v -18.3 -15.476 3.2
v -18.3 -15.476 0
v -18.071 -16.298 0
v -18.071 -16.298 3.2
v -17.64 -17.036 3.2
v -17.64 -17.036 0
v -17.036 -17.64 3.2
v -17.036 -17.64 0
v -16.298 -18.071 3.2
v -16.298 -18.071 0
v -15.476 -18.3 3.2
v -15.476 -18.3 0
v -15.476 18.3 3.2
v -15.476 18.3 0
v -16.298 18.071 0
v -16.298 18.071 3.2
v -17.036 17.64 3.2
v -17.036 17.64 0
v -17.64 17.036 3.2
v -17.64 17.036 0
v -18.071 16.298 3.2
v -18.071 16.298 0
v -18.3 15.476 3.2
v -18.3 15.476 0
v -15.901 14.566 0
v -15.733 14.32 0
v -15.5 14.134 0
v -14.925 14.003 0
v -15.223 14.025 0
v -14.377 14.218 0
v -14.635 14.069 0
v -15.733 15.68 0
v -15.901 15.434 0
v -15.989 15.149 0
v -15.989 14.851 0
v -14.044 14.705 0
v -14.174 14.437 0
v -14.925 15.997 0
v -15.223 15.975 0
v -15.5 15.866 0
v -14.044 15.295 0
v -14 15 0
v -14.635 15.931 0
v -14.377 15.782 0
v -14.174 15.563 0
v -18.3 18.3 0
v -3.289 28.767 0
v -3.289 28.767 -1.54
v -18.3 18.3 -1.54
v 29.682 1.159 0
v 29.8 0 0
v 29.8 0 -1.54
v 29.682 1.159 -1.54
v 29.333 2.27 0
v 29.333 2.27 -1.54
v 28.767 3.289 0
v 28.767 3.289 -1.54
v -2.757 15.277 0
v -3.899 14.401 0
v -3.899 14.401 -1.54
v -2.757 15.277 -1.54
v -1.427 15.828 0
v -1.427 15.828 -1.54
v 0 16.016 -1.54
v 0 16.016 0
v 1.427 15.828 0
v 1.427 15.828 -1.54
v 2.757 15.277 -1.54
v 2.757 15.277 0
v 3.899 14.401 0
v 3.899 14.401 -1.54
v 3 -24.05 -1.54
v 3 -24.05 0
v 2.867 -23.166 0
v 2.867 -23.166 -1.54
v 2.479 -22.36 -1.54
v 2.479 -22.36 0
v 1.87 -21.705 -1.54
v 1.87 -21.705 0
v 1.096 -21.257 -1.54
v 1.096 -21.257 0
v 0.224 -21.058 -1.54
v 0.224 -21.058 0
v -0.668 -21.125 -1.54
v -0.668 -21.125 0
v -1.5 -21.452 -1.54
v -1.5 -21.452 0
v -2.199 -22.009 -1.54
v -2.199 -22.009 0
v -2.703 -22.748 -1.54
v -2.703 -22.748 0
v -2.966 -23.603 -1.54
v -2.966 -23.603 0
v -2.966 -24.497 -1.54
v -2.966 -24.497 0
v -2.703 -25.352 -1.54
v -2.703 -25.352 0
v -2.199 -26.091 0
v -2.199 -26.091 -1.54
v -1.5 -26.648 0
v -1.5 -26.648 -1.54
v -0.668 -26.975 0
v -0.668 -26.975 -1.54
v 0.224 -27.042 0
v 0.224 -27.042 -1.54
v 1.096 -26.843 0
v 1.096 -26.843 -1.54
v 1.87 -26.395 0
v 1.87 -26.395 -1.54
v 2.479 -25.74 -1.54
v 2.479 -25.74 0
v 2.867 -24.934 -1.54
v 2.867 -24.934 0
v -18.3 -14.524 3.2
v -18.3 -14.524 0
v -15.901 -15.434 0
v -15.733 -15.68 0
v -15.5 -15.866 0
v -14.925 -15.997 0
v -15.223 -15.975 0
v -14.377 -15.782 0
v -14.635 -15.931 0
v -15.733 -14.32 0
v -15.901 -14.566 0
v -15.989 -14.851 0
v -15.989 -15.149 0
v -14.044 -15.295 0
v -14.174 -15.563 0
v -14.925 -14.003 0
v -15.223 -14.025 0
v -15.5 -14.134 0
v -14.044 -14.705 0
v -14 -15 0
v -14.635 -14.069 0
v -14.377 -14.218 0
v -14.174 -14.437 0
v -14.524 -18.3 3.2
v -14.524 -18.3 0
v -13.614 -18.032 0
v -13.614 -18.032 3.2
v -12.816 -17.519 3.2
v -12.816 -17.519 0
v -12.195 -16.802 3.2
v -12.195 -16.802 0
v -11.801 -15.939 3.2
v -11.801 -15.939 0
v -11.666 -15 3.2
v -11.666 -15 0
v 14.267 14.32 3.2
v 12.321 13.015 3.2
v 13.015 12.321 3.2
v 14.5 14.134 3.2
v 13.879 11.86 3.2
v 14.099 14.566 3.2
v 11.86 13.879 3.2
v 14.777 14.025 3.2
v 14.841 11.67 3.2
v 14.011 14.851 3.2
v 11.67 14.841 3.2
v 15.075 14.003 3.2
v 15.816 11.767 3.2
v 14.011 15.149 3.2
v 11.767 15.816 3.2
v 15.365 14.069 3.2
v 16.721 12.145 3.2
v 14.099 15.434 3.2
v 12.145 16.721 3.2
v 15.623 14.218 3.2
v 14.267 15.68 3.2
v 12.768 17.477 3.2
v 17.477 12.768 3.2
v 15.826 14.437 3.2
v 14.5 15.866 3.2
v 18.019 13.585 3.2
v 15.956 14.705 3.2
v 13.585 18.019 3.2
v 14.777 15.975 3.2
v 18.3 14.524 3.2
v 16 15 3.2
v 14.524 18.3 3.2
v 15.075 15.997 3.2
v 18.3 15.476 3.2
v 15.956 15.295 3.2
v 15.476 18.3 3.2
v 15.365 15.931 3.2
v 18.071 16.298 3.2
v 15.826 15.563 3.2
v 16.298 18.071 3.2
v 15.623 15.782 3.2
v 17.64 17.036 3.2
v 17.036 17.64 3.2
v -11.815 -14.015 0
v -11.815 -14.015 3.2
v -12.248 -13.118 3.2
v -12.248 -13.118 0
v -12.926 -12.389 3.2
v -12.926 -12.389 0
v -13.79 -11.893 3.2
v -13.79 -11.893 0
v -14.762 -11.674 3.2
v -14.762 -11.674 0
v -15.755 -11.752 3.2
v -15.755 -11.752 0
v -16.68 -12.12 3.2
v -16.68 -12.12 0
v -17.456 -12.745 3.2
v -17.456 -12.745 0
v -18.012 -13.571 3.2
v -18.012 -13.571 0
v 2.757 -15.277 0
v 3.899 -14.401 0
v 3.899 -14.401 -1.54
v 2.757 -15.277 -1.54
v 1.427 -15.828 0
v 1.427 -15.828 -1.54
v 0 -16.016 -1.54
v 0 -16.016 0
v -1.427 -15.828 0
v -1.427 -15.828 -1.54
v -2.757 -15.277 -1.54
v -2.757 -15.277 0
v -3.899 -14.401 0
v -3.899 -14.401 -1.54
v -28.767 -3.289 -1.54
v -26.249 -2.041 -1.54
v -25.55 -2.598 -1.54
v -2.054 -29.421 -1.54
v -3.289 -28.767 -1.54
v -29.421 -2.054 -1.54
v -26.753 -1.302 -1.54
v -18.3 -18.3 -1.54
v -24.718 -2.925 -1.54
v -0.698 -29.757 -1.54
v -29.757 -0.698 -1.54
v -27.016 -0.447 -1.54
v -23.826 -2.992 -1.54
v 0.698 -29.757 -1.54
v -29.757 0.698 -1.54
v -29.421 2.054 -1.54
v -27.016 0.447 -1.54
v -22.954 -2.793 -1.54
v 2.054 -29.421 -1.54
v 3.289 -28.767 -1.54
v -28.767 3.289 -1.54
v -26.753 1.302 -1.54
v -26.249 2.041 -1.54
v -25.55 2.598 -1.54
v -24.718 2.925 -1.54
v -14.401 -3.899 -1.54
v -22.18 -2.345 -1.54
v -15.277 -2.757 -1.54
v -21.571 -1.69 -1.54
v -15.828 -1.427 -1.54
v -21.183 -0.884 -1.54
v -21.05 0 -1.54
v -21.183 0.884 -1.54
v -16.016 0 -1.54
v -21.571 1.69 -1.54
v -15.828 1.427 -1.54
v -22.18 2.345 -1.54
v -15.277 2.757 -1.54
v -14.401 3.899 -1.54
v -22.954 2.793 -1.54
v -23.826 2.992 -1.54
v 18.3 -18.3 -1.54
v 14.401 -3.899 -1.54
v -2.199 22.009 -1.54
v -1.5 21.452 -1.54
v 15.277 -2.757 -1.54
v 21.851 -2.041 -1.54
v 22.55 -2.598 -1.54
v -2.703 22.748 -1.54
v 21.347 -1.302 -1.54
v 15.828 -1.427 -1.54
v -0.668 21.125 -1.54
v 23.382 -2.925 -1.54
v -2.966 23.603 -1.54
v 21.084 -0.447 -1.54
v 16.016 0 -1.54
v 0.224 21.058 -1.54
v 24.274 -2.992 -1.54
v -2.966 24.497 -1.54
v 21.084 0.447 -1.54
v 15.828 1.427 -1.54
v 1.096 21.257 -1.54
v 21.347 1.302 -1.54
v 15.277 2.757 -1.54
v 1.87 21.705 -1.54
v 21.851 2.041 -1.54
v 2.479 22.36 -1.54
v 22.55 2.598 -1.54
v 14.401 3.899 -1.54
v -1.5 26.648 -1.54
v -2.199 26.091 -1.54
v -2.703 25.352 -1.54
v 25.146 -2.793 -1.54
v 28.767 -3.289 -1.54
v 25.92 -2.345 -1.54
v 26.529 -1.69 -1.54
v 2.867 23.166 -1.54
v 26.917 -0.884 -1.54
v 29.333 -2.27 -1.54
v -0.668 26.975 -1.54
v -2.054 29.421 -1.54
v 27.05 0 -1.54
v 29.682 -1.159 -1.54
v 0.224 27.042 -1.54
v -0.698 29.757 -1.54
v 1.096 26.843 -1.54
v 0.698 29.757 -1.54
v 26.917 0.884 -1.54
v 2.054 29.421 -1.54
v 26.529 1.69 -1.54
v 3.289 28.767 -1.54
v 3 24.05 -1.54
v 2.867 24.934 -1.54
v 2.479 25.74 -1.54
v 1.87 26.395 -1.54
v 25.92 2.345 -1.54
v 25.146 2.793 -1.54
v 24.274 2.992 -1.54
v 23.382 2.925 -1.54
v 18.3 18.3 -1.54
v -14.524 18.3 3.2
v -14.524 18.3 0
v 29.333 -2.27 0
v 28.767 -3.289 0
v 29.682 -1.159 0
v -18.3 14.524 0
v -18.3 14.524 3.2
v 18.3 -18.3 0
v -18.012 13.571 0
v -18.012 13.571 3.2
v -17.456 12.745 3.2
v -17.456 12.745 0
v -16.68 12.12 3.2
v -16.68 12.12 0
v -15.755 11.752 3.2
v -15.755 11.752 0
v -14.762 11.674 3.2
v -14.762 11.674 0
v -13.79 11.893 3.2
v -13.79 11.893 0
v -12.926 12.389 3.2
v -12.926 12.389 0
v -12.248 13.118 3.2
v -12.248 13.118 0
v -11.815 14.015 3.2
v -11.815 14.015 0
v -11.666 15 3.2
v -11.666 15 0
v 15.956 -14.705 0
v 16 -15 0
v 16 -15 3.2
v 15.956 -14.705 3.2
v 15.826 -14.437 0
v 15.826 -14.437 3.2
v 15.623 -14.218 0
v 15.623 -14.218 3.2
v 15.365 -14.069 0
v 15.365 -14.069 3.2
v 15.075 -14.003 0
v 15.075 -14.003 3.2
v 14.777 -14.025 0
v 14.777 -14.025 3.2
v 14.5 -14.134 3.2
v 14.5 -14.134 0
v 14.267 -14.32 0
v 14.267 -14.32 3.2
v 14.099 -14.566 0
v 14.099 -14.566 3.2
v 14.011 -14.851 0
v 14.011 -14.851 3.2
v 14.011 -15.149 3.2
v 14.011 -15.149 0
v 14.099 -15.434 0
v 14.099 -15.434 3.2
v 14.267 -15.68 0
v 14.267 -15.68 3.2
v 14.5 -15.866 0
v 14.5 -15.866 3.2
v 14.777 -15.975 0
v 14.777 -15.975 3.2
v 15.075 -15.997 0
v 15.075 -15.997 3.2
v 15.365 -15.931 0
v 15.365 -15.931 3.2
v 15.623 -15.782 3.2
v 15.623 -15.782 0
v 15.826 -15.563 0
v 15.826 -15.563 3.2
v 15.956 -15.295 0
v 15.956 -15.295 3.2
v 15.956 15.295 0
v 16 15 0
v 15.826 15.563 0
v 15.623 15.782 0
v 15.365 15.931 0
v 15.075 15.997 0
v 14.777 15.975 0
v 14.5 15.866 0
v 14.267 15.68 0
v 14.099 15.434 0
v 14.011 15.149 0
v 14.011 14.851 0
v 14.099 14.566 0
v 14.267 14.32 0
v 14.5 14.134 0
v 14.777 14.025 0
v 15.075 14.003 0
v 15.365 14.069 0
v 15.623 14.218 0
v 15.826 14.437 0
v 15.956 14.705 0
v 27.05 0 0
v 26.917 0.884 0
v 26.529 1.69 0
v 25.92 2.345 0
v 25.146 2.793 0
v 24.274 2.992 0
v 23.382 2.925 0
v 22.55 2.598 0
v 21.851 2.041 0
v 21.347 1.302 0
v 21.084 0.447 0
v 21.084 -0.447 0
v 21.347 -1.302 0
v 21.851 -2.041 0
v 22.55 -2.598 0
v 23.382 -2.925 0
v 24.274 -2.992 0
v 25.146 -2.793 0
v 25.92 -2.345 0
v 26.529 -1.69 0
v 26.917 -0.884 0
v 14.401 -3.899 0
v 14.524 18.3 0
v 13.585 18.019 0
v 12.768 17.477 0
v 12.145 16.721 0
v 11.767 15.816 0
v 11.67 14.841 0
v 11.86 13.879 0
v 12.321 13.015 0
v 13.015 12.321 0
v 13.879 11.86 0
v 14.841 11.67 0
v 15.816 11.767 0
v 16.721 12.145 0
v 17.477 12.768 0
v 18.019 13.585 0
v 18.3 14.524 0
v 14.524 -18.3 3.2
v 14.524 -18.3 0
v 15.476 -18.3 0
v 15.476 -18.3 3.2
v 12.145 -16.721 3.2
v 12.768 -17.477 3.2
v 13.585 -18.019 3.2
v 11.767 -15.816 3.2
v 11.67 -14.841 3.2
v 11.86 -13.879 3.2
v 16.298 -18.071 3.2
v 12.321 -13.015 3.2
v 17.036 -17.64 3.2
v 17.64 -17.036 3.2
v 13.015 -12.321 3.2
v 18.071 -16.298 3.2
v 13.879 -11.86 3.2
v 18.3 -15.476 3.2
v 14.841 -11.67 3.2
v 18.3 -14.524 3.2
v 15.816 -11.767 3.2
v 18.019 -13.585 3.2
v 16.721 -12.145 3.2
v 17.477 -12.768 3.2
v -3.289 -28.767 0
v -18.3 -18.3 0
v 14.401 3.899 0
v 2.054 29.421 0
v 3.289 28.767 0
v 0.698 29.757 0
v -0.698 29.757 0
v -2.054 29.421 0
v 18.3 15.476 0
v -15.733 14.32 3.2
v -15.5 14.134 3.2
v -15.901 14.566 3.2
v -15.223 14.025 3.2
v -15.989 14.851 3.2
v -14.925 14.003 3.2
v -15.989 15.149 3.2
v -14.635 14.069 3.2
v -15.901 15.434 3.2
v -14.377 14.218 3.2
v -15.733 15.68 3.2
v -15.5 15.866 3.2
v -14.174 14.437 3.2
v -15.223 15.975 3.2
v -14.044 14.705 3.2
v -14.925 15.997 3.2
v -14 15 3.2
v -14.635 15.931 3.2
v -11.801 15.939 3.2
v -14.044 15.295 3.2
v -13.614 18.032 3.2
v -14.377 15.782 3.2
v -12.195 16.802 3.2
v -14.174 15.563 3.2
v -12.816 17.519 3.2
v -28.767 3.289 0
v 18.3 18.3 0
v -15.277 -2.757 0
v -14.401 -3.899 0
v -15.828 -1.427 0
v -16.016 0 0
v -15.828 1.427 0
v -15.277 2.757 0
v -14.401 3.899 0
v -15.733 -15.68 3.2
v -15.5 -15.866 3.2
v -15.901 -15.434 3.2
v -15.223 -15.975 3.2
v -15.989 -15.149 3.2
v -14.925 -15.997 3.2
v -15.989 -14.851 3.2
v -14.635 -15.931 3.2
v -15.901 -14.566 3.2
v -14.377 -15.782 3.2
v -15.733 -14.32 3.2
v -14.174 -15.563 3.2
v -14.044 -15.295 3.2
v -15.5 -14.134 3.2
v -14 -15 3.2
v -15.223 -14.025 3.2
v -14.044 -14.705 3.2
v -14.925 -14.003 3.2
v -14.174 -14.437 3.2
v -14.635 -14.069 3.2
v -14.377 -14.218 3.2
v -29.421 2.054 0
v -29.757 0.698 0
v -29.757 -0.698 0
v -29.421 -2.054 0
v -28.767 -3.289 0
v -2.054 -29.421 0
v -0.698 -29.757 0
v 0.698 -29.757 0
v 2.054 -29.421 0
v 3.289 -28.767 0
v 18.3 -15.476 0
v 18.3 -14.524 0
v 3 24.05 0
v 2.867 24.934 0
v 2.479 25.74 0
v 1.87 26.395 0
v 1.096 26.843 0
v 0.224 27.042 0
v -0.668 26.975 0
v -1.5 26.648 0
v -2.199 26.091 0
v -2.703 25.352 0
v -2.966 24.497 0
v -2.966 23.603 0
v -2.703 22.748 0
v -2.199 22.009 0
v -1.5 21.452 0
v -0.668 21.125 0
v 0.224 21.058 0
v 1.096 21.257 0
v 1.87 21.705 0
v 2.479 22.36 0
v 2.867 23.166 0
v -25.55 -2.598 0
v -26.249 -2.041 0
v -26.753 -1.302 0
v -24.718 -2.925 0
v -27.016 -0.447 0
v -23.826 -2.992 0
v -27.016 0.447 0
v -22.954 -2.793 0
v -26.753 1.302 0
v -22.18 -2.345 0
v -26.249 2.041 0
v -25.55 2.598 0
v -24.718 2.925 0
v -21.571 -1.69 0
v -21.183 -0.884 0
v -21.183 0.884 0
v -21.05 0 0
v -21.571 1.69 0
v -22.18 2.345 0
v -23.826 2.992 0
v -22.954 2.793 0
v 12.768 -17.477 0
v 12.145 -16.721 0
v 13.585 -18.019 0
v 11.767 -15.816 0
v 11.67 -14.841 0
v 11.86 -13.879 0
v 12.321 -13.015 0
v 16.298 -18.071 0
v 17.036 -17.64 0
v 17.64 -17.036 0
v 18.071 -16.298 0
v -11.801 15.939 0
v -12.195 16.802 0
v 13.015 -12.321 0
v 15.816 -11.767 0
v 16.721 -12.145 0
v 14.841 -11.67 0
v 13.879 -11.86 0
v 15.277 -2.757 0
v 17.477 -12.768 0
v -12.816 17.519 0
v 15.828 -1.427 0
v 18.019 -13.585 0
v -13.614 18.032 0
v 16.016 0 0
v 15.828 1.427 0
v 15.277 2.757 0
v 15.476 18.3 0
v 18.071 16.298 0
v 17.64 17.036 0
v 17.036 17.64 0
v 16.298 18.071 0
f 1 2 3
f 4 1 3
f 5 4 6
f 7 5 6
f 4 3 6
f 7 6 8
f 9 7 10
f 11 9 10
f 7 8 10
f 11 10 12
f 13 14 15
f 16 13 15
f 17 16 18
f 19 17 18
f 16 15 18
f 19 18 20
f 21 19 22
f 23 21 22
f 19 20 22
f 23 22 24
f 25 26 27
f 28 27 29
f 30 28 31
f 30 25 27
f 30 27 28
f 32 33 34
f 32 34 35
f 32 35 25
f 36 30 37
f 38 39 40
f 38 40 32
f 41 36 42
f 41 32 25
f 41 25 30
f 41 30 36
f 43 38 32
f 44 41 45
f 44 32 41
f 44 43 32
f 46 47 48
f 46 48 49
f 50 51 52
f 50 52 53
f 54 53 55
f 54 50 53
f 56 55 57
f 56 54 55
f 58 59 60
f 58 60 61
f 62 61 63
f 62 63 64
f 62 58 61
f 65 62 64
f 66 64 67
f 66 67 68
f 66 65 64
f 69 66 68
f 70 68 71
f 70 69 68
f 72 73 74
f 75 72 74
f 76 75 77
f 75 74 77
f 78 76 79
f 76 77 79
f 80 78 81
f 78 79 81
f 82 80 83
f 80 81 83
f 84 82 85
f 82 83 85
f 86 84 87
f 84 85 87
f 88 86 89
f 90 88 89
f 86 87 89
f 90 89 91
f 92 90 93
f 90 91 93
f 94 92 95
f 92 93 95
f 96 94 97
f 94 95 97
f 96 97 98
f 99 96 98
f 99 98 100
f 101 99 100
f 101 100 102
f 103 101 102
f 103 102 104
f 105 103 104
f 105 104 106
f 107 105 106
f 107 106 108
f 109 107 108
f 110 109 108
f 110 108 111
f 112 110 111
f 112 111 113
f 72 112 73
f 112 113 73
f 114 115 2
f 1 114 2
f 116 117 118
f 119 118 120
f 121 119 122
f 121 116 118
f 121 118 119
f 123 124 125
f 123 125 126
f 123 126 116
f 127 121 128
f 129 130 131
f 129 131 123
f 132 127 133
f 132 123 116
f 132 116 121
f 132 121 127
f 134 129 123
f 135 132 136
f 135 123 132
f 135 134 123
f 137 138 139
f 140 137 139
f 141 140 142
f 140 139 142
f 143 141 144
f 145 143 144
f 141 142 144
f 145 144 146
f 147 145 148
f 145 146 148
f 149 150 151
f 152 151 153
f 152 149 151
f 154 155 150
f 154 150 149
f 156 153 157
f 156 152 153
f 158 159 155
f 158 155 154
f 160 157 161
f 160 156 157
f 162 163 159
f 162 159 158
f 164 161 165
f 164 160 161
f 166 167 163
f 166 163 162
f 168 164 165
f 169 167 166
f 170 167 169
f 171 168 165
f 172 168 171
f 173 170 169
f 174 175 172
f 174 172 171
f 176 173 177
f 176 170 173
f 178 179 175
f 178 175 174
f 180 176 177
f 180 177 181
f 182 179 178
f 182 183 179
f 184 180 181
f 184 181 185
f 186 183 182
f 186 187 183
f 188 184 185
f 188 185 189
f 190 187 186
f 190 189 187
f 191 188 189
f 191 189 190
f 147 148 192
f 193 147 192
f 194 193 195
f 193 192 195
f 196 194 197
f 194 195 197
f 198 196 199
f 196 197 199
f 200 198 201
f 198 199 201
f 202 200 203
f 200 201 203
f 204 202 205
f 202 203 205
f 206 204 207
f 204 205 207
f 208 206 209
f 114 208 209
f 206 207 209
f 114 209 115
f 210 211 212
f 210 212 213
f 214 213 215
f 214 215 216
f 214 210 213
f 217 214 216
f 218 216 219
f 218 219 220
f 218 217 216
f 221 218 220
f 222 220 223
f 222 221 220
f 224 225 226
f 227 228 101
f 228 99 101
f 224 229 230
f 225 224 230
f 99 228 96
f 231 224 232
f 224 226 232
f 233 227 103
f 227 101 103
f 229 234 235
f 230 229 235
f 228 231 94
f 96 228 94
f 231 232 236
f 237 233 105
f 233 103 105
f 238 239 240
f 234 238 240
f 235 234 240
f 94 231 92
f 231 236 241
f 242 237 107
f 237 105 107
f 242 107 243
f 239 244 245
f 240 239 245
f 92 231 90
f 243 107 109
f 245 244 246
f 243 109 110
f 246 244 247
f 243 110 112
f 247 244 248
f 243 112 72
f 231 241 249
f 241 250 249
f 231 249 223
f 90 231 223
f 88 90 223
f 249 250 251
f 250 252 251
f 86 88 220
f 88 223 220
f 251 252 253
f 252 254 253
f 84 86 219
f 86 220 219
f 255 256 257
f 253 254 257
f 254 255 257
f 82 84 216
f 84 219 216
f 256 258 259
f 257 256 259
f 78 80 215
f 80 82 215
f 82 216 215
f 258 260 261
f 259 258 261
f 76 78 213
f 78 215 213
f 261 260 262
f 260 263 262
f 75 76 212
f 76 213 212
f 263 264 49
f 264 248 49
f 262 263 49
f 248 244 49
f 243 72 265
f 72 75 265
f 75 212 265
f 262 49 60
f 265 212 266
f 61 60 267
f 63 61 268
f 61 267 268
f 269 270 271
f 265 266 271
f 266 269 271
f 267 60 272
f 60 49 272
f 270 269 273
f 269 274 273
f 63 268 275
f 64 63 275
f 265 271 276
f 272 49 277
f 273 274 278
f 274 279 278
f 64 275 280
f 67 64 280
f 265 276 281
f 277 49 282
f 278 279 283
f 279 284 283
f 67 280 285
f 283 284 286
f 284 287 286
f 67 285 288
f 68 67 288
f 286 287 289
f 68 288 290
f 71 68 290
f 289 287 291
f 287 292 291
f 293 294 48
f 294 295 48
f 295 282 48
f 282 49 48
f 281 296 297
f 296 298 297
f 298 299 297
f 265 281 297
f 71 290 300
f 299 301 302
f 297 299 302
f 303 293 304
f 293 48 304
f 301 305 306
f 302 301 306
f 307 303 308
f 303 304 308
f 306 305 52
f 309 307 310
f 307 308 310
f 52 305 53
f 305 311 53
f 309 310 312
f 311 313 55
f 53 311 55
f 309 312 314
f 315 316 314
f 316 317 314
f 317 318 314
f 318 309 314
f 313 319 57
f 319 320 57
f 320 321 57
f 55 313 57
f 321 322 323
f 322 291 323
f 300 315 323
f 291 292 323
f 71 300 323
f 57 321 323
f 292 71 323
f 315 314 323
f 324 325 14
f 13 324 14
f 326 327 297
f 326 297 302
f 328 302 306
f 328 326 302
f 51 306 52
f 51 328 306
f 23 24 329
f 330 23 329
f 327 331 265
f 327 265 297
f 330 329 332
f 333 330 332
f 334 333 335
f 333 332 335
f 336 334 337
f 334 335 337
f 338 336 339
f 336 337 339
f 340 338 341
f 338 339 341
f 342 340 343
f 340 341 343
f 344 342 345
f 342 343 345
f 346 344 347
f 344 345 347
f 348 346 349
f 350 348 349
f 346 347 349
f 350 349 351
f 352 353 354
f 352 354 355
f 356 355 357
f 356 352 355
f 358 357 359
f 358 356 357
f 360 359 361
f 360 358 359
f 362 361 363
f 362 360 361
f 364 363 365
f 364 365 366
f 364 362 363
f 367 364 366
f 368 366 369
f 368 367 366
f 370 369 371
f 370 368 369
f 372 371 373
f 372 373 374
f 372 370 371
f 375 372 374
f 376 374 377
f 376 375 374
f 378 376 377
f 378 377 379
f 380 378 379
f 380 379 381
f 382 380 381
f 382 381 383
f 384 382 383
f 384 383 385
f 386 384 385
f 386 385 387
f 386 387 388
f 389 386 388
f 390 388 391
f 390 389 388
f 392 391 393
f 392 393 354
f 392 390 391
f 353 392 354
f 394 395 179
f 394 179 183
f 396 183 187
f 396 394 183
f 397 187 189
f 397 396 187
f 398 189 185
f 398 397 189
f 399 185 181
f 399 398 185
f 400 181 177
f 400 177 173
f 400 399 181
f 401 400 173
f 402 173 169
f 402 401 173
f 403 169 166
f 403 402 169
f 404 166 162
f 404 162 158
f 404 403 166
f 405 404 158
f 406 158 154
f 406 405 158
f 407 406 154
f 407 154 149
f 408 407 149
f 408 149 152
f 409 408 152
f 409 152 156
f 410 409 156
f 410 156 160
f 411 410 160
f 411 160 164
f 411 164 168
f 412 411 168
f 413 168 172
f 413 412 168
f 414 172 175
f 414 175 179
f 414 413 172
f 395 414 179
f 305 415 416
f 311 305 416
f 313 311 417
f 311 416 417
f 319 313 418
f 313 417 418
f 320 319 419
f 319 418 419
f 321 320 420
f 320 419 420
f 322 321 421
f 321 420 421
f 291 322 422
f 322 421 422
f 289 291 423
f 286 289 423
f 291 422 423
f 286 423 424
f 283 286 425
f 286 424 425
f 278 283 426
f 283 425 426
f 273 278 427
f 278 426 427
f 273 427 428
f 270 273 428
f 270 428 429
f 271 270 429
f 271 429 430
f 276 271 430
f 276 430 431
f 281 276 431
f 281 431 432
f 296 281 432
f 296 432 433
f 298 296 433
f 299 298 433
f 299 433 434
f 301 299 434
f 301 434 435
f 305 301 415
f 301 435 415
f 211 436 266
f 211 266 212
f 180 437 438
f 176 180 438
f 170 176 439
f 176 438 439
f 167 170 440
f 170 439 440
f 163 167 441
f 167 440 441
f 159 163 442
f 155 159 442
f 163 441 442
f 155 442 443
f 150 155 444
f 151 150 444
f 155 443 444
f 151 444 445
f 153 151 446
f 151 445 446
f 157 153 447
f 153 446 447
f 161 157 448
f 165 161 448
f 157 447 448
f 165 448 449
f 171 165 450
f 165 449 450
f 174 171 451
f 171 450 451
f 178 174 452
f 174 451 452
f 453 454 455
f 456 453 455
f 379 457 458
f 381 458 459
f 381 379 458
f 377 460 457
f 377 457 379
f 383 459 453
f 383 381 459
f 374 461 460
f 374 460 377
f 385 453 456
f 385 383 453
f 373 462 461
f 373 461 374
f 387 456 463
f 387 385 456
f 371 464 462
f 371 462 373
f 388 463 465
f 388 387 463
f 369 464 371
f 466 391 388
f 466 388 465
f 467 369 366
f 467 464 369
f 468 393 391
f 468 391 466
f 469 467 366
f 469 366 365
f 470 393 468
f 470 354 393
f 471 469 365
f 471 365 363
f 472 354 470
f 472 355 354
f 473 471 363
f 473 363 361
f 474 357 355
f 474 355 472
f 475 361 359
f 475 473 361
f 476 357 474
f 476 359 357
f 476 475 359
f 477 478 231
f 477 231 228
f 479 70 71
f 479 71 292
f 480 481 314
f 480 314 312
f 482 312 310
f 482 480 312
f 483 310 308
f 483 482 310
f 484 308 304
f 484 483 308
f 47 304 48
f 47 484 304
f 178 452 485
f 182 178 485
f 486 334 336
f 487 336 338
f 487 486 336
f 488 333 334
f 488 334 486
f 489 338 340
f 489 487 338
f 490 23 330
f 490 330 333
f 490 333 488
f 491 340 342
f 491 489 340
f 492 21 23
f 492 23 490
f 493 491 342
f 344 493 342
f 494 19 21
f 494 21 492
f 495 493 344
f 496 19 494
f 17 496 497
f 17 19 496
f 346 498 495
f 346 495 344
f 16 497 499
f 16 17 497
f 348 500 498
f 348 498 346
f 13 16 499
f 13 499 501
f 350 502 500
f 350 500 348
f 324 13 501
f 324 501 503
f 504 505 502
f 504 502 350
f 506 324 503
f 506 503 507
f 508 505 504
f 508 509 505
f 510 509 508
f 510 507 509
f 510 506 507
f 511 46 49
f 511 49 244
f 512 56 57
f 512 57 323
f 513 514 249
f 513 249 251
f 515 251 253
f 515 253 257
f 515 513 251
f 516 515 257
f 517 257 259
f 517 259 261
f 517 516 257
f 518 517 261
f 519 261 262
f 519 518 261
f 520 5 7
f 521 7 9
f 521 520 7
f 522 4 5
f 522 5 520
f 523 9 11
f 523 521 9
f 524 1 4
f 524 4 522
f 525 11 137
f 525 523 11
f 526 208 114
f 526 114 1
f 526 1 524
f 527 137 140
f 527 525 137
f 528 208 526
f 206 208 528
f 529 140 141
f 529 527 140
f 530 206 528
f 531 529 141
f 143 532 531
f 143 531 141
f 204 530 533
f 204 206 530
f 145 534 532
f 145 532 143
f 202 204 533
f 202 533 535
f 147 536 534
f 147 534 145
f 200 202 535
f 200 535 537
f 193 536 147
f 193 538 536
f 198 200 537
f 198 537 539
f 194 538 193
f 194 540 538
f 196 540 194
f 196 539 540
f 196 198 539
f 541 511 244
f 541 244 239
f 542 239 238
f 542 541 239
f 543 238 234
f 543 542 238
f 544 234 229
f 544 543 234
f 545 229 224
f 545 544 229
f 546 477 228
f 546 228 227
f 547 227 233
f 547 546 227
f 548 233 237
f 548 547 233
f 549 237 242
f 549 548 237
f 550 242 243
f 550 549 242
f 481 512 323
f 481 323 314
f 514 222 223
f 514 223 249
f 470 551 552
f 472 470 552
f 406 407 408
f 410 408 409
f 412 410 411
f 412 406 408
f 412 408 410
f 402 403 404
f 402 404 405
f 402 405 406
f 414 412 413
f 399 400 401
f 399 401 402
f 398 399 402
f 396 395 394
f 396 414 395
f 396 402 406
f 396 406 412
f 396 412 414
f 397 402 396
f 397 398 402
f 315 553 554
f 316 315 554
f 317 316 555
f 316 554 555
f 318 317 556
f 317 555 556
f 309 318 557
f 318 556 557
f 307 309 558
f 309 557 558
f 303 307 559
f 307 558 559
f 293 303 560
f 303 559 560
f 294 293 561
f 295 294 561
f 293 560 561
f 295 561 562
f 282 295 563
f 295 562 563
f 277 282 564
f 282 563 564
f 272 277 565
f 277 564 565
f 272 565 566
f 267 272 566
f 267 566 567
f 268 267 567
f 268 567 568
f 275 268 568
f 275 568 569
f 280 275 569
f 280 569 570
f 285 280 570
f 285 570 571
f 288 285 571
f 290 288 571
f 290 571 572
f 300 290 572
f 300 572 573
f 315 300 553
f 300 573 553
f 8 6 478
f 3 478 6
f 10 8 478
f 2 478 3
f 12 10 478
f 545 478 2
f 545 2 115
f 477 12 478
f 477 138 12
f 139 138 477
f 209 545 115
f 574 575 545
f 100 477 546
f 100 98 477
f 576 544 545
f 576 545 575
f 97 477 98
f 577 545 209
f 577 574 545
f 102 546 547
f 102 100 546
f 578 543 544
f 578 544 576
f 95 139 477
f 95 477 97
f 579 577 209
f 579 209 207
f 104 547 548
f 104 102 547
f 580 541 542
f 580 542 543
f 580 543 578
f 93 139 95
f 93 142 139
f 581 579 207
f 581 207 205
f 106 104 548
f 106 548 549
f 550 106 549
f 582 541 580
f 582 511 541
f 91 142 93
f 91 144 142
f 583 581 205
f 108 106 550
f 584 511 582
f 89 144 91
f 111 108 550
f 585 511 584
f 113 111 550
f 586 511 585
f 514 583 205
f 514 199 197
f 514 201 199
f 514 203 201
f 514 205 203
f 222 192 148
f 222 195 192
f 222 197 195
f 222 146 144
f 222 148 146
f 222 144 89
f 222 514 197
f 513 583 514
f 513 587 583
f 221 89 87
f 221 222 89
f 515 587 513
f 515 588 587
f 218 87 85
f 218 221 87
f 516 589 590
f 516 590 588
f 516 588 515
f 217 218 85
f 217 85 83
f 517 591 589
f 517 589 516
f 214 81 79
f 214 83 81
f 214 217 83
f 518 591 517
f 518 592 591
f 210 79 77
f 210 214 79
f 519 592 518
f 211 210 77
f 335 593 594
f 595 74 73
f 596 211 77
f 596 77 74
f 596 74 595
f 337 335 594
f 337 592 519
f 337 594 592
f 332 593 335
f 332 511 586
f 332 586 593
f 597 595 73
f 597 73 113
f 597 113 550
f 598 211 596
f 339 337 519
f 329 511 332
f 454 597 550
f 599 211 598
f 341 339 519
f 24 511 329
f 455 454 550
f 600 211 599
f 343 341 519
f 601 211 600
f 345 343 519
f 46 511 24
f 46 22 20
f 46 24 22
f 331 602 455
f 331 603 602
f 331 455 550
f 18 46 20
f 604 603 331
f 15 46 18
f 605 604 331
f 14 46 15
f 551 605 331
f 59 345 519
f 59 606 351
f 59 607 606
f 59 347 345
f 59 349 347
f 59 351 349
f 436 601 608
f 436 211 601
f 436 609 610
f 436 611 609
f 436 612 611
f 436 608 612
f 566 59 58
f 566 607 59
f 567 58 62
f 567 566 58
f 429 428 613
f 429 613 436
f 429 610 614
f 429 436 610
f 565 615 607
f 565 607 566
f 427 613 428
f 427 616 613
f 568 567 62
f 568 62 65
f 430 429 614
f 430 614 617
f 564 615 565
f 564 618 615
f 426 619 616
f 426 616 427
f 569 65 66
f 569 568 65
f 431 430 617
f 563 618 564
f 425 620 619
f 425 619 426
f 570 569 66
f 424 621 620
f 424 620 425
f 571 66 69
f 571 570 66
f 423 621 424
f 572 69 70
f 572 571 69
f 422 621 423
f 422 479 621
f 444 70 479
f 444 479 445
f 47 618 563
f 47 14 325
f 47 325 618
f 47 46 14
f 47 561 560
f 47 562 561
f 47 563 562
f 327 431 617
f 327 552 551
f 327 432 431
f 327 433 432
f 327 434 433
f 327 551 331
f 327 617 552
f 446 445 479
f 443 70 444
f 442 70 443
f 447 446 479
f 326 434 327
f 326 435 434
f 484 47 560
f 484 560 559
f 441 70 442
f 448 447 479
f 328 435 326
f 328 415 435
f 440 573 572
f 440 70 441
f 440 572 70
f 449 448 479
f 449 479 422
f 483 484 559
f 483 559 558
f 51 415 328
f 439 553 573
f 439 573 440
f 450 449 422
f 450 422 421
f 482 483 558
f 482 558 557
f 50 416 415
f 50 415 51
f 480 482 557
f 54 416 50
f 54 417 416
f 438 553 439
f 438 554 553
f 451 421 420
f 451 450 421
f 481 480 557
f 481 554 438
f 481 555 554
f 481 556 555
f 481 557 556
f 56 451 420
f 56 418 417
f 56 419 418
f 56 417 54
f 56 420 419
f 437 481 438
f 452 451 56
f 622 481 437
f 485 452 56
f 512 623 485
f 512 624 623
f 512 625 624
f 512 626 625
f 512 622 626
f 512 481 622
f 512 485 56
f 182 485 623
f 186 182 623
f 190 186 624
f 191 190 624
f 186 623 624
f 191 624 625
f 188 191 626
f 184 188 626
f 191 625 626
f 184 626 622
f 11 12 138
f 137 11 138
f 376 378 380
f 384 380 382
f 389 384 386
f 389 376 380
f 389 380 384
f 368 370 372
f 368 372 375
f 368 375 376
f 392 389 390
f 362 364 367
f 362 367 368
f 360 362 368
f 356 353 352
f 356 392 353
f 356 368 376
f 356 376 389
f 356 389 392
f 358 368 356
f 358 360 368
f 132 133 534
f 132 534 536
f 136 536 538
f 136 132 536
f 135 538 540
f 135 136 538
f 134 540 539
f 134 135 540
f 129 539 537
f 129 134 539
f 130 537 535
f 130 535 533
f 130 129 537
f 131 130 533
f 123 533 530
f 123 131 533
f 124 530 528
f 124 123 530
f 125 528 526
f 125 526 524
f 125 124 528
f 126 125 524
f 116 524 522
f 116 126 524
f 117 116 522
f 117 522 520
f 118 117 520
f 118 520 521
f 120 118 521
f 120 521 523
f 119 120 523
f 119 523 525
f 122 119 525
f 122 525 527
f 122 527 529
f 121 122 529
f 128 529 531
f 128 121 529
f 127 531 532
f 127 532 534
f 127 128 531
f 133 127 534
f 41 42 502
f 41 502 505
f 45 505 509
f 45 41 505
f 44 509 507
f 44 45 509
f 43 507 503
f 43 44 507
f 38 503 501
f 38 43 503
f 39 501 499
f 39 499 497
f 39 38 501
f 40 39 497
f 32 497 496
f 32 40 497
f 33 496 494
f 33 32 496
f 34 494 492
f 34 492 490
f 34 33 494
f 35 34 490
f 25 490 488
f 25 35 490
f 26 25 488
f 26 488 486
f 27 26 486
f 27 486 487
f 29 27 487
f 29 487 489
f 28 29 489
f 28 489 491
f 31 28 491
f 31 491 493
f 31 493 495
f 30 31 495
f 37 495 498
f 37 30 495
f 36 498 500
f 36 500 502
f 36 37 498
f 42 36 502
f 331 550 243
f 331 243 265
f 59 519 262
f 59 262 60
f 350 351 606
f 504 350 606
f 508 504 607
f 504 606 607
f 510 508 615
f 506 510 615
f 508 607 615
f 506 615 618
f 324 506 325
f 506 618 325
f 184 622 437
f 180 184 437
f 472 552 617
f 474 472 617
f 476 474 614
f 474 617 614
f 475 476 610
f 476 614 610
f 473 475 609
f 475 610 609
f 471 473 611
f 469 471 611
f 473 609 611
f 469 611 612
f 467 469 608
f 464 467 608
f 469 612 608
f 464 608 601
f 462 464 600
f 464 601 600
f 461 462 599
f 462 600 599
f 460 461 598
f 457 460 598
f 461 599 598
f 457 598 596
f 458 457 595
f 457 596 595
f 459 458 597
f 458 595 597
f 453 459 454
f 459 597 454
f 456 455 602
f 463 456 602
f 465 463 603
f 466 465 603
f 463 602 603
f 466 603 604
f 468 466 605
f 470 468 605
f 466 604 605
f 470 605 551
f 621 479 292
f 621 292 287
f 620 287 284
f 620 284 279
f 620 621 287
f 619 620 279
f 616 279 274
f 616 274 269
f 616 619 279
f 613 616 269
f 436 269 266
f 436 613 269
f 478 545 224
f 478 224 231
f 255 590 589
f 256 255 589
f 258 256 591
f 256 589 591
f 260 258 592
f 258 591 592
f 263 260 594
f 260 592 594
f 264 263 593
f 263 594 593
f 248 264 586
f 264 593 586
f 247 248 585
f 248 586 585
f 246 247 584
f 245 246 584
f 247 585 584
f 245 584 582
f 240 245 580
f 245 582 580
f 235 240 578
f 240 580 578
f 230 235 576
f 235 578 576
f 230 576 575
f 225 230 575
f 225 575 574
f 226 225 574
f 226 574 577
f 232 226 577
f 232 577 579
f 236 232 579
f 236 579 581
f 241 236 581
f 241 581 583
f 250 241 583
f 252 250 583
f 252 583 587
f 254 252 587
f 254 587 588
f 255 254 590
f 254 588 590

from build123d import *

# Parameters (mm, degrees)
F0_R     = 3
F0_R_2   = 1
F1_DEPTH = 1.54
F2_DEPTH = 3.2


with BuildPart() as f1:
    # F0 (on Top) → F1 (new body)
    with BuildSketch(Plane.XY):
        with BuildLine():
            Line((-2.26e-08, 18.3), (-14.5244322999, 18.3))
            ThreePointArc((-14.5244322999, 18.3), (-12.4799056806, 17.1829542503), (-11.6659087239, 15))
            ThreePointArc((-11.6659087239, 15), (-14.7616059709, 11.6744424642), (-18.3, 14.5244322999))
            Line((-18.3, 14.5244322999), (-18.3, 0))
            Line((-18.3, 0), (-18.3, -14.5244322999))
            ThreePointArc((-18.3, -14.5244322999), (-14.7616059709, -11.6744424642), (-11.6659087239, -15))
            ThreePointArc((-11.6659087239, -15), (-12.4799056806, -17.1829542503), (-14.5244322999, -18.3))
            Line((-14.5244322999, -18.3), (0, -18.3))
            Line((0, -18.3), (14.5244322999, -18.3))
            ThreePointArc((14.5244322999, -18.3), (12.6424414496, -12.6424414496), (18.3, -14.5244322999))
            Line((18.3, -14.5244322999), (18.3, -7.7e-09))
            Line((18.3, -7.7e-09), (18.3, 14.5244322999))
            ThreePointArc((18.3, 14.5244322999), (12.6424414496, 12.6424414496), (14.5244322999, 18.3))
            Line((14.5244322999, 18.3), (-2.26e-08, 18.3))
        make_face()
        with BuildLine():
            ThreePointArc((-14.4005392066, -3.8994607934), (-16.0157487532, 0), (-14.4005392066, 3.8994607934))
            Line((-14.4005392066, 3.8994607934), (-3.8994607934, 14.4005392066))
            ThreePointArc((-3.8994607934, 14.4005392066), (0, 16.0157487532), (3.8994607934, 14.4005392066))
            Line((3.8994607934, 14.4005392066), (14.4005392066, 3.8994607934))
            ThreePointArc((14.4005392066, 3.8994607934), (16.0157487532, 0), (14.4005392066, -3.8994607934))
            Line((14.4005392066, -3.8994607934), (3.8994607934, -14.4005392066))
            ThreePointArc((3.8994607934, -14.4005392066), (0, -16.0157487532), (-3.8994607934, -14.4005392066))
            Line((-3.8994607934, -14.4005392066), (-14.4005392066, -3.8994607934))
        make_face(mode=Mode.SUBTRACT)
        with BuildLine():
            Line((-3.2887057433, 28.766663496), (-18.3, 18.3))
            Line((-18.3, 18.3), (-15.4755677001, 18.3))
            ThreePointArc((-15.4755677001, 18.3), (-15, 18.3340912761), (-14.5244322999, 18.3))
            Line((-14.5244322999, 18.3), (-2.26e-08, 18.3))
            ThreePointArc((-2.26e-08, 18.3), (-5.4855863486, 22.3263868149), (-3.2887057433, 28.766663496))
        make_face()
        with BuildLine():
            Line((18.3, 18.3), (3.2887057433, 28.766663496))
            ThreePointArc((3.2887057433, 28.766663496), (5.0976738825, 26.7101167245), (5.75, 24.05))
            ThreePointArc((5.75, 24.05), (4.0658639838, 19.9841360002), (-2.26e-08, 18.3))
            Line((-2.26e-08, 18.3), (14.5244322999, 18.3))
            ThreePointArc((14.5244322999, 18.3), (15, 18.3340912761), (15.4755677001, 18.3))
            Line((15.4755677001, 18.3), (18.3, 18.3))
        make_face()
        with BuildLine():
            ThreePointArc((3.2887057433, 28.766663496), (0, 29.8), (-3.2887057433, 28.766663496))
            ThreePointArc((-3.2887057433, 28.766663496), (-5.4855863486, 22.3263868149), (-2.26e-08, 18.3))
            ThreePointArc((-2.26e-08, 18.3), (4.0658639838, 19.9841360002), (5.75, 24.05))
            ThreePointArc((5.75, 24.05), (5.0976738825, 26.7101167245), (3.2887057433, 28.766663496))
        make_face()
        with Locations((0, 24.05)):
            Circle(F0_R, mode=Mode.SUBTRACT)
        with BuildLine():
            Line((28.766663496, 3.2887057433), (18.3, 18.3))
            Line((18.3, 18.3), (18.3, 15.4755677001))
            ThreePointArc((18.3, 15.4755677001), (18.3255575358, 15.2383940291), (18.3340912761, 15))
            ThreePointArc((18.3340912761, 15), (18.3255575358, 14.7616059709), (18.3, 14.5244322999))
            Line((18.3, 14.5244322999), (18.3, -7.7e-09))
            ThreePointArc((18.3, -7.7e-09), (22.3263868004, 5.4855863441), (28.766663496, 3.2887057433))
        make_face()
        with BuildLine():
            ThreePointArc((28.766663496, -3.2887057433), (22.3263868078, -5.4855863464), (18.3, -7.7e-09))
            Line((18.3, -7.7e-09), (18.3, -14.5244322999))
            ThreePointArc((18.3, -14.5244322999), (18.3255575358, -14.7616059709), (18.3340912761, -15))
            ThreePointArc((18.3340912761, -15), (18.3255575358, -15.2383940291), (18.3, -15.4755677001))
            Line((18.3, -15.4755677001), (18.3, -18.3))
            Line((18.3, -18.3), (28.766663496, -3.2887057433))
        make_face()
        with BuildLine():
            ThreePointArc((29.8, 0), (29.5355863452, 1.7236131959), (28.766663496, 3.2887057433))
            ThreePointArc((28.766663496, 3.2887057433), (22.3263868004, 5.4855863441), (18.3, -7.7e-09))
            ThreePointArc((18.3, -7.7e-09), (22.3263868078, -5.4855863464), (28.766663496, -3.2887057433))
            ThreePointArc((28.766663496, -3.2887057433), (29.5355863452, -1.7236131959), (29.8, 0))
        make_face()
        with Locations((24.05, 0)):
            Circle(F0_R, mode=Mode.SUBTRACT)
        with BuildLine():
            ThreePointArc((18.3, -14.5244322999), (12.6424414496, -12.6424414496), (14.5244322999, -18.3))
            Line((14.5244322999, -18.3), (15.4755677001, -18.3))
            ThreePointArc((15.4755677001, -18.3), (17.3575585504, -17.3575585504), (18.3, -15.4755677001))
            Line((18.3, -15.4755677001), (18.3, -14.5244322999))
        make_face()
        with Locations((15, -15)):
            Circle(F0_R_2, mode=Mode.SUBTRACT)
        with BuildLine():
            Line((15.4755677001, 18.3), (14.5244322999, 18.3))
            ThreePointArc((14.5244322999, 18.3), (12.6424414496, 12.6424414496), (18.3, 14.5244322999))
            Line((18.3, 14.5244322999), (18.3, 15.4755677001))
            ThreePointArc((18.3, 15.4755677001), (17.3575585504, 17.3575585504), (15.4755677001, 18.3))
        make_face()
        with Locations((15, 15)):
            Circle(F0_R_2, mode=Mode.SUBTRACT)
        with Locations((15, 15)):
            Circle(F0_R_2)
        with BuildLine():
            Line((18.3, 15.4755677001), (18.3, 18.3))
            Line((18.3, 18.3), (15.4755677001, 18.3))
            ThreePointArc((15.4755677001, 18.3), (17.3575585504, 17.3575585504), (18.3, 15.4755677001))
        make_face()
        with BuildLine():
            Line((-15.4755677001, 18.3), (-18.3, 18.3))
            Line((-18.3, 18.3), (-18.3, 15.4755677001))
            ThreePointArc((-18.3, 15.4755677001), (-17.3575585504, 17.3575585504), (-15.4755677001, 18.3))
        make_face()
        with BuildLine():
            Line((-14.5244322999, 18.3), (-15.4755677001, 18.3))
            ThreePointArc((-15.4755677001, 18.3), (-17.3575585504, 17.3575585504), (-18.3, 15.4755677001))
            Line((-18.3, 15.4755677001), (-18.3, 14.5244322999))
            ThreePointArc((-18.3, 14.5244322999), (-14.7616059709, 11.6744424642), (-11.6659087239, 15))
            ThreePointArc((-11.6659087239, 15), (-12.4799056806, 17.1829542503), (-14.5244322999, 18.3))
        make_face()
        with Locations((-15, 15)):
            Circle(F0_R_2, mode=Mode.SUBTRACT)
        with Locations((-15, 15)):
            Circle(F0_R_2)
        with BuildLine():
            ThreePointArc((-18.3, 0), (-22.3263868041, 5.4855863452), (-28.766663496, 3.2887057433))
            ThreePointArc((-28.766663496, 3.2887057433), (-29.8, 0), (-28.766663496, -3.2887057433))
            ThreePointArc((-28.766663496, -3.2887057433), (-22.3263868041, -5.4855863452), (-18.3, 0))
        make_face()
        with Locations((-24.05, 0)):
            Circle(F0_R, mode=Mode.SUBTRACT)
        with BuildLine():
            Line((-18.3, 15.4755677001), (-18.3, 18.3))
            Line((-18.3, 18.3), (-28.766663496, 3.2887057433))
            ThreePointArc((-28.766663496, 3.2887057433), (-22.3263868041, 5.4855863452), (-18.3, 0))
            Line((-18.3, 0), (-18.3, 14.5244322999))
            ThreePointArc((-18.3, 14.5244322999), (-18.3340912761, 15), (-18.3, 15.4755677001))
        make_face()
        with BuildLine():
            Line((-18.3, -14.5244322999), (-18.3, 0))
            ThreePointArc((-18.3, 0), (-22.3263868041, -5.4855863452), (-28.766663496, -3.2887057433))
            Line((-28.766663496, -3.2887057433), (-18.3, -18.3))
            Line((-18.3, -18.3), (-18.3, -15.4755677001))
            ThreePointArc((-18.3, -15.4755677001), (-18.3340912761, -15), (-18.3, -14.5244322999))
        make_face()
        with BuildLine():
            ThreePointArc((-11.6659087239, -15), (-14.7616059709, -11.6744424642), (-18.3, -14.5244322999))
            Line((-18.3, -14.5244322999), (-18.3, -15.4755677001))
            ThreePointArc((-18.3, -15.4755677001), (-17.3575585504, -17.3575585504), (-15.4755677001, -18.3))
            Line((-15.4755677001, -18.3), (-14.5244322999, -18.3))
            ThreePointArc((-14.5244322999, -18.3), (-12.4799056806, -17.1829542503), (-11.6659087239, -15))
        make_face()
        with Locations((-15, -15)):
            Circle(F0_R_2, mode=Mode.SUBTRACT)
        with Locations((-15, -15)):
            Circle(F0_R_2)
        with BuildLine():
            Line((-18.3, -15.4755677001), (-18.3, -18.3))
            Line((-18.3, -18.3), (-15.4755677001, -18.3))
            ThreePointArc((-15.4755677001, -18.3), (-17.3575585504, -17.3575585504), (-18.3, -15.4755677001))
        make_face()
        with BuildLine():
            Line((-15.4755677001, -18.3), (-18.3, -18.3))
            Line((-18.3, -18.3), (-3.2887057433, -28.766663496))
            ThreePointArc((-3.2887057433, -28.766663496), (-5.4855863452, -22.3263868041), (0, -18.3))
            Line((0, -18.3), (-14.5244322999, -18.3))
            ThreePointArc((-14.5244322999, -18.3), (-15, -18.3340912761), (-15.4755677001, -18.3))
        make_face()
        with BuildLine():
            ThreePointArc((0, -18.3), (-5.4855863452, -22.3263868041), (-3.2887057433, -28.766663496))
            ThreePointArc((-3.2887057433, -28.766663496), (0, -29.8), (3.2887057433, -28.766663496))
            ThreePointArc((3.2887057433, -28.766663496), (5.0976738825, -26.7101167245), (5.75, -24.05))
            ThreePointArc((5.75, -24.05), (4.0658639918, -19.9841360082), (0, -18.3))
        make_face()
        with Locations((0, -24.05)):
            Circle(F0_R, mode=Mode.SUBTRACT)
        with BuildLine():
            ThreePointArc((5.75, -24.05), (5.0976738825, -26.7101167245), (3.2887057433, -28.766663496))
            Line((3.2887057433, -28.766663496), (18.3, -18.3))
            Line((18.3, -18.3), (15.4755677001, -18.3))
            ThreePointArc((15.4755677001, -18.3), (15, -18.3340912761), (14.5244322999, -18.3))
            Line((14.5244322999, -18.3), (0, -18.3))
            ThreePointArc((0, -18.3), (4.0658639918, -19.9841360082), (5.75, -24.05))
        make_face()
        with BuildLine():
            Line((15.4755677001, -18.3), (18.3, -18.3))
            Line((18.3, -18.3), (18.3, -15.4755677001))
            ThreePointArc((18.3, -15.4755677001), (17.3575585504, -17.3575585504), (15.4755677001, -18.3))
        make_face()
        with Locations((15, -15)):
            Circle(F0_R_2)
        with BuildLine():
            Line((-14.5244322999, -18.3), (-15.4755677001, -18.3))
            ThreePointArc((-15.4755677001, -18.3), (-15, -18.3340912761), (-14.5244322999, -18.3))
        make_face()
        with BuildLine():
            Line((-18.3, -15.4755677001), (-18.3, -14.5244322999))
            ThreePointArc((-18.3, -14.5244322999), (-18.3340912761, -15), (-18.3, -15.4755677001))
        make_face()
        with BuildLine():
            Line((-18.3, 14.5244322999), (-18.3, 15.4755677001))
            ThreePointArc((-18.3, 15.4755677001), (-18.3340912761, 15), (-18.3, 14.5244322999))
        make_face()
        with BuildLine():
            ThreePointArc((-14.5244322999, 18.3), (-15, 18.3340912761), (-15.4755677001, 18.3))
            Line((-15.4755677001, 18.3), (-14.5244322999, 18.3))
        make_face()
        with BuildLine():
            ThreePointArc((15.4755677001, 18.3), (15, 18.3340912761), (14.5244322999, 18.3))
            Line((14.5244322999, 18.3), (15.4755677001, 18.3))
        make_face()
        with BuildLine():
            ThreePointArc((18.3340912761, 15), (18.3255575358, 15.2383940291), (18.3, 15.4755677001))
            Line((18.3, 15.4755677001), (18.3, 14.5244322999))
            ThreePointArc((18.3, 14.5244322999), (18.3255575358, 14.7616059709), (18.3340912761, 15))
        make_face()
        with BuildLine():
            Line((15.4755677001, -18.3), (14.5244322999, -18.3))
            ThreePointArc((14.5244322999, -18.3), (15, -18.3340912761), (15.4755677001, -18.3))
        make_face()
        with BuildLine():
            ThreePointArc((18.3340912761, -15), (18.3255575358, -14.7616059709), (18.3, -14.5244322999))
            Line((18.3, -14.5244322999), (18.3, -15.4755677001))
            ThreePointArc((18.3, -15.4755677001), (18.3255575358, -15.2383940291), (18.3340912761, -15))
        make_face()
    extrude(amount=-F1_DEPTH)

    # F0 (on Top) → F2 (join)
    with BuildSketch(Plane.XY):
        with BuildLine():
            ThreePointArc((-11.6659087239, -15), (-14.7616059709, -11.6744424642), (-18.3, -14.5244322999))
            Line((-18.3, -14.5244322999), (-18.3, -15.4755677001))
            ThreePointArc((-18.3, -15.4755677001), (-17.3575585504, -17.3575585504), (-15.4755677001, -18.3))
            Line((-15.4755677001, -18.3), (-14.5244322999, -18.3))
            ThreePointArc((-14.5244322999, -18.3), (-12.4799056806, -17.1829542503), (-11.6659087239, -15))
        make_face()
        with Locations((-15, -15)):
            Circle(F0_R_2, mode=Mode.SUBTRACT)
        with BuildLine():
            Line((-14.5244322999, 18.3), (-15.4755677001, 18.3))
            ThreePointArc((-15.4755677001, 18.3), (-17.3575585504, 17.3575585504), (-18.3, 15.4755677001))
            Line((-18.3, 15.4755677001), (-18.3, 14.5244322999))
            ThreePointArc((-18.3, 14.5244322999), (-14.7616059709, 11.6744424642), (-11.6659087239, 15))
            ThreePointArc((-11.6659087239, 15), (-12.4799056806, 17.1829542503), (-14.5244322999, 18.3))
        make_face()
        with Locations((-15, 15)):
            Circle(F0_R_2, mode=Mode.SUBTRACT)
        with BuildLine():
            ThreePointArc((18.3, -14.5244322999), (12.6424414496, -12.6424414496), (14.5244322999, -18.3))
            Line((14.5244322999, -18.3), (15.4755677001, -18.3))
            ThreePointArc((15.4755677001, -18.3), (17.3575585504, -17.3575585504), (18.3, -15.4755677001))
            Line((18.3, -15.4755677001), (18.3, -14.5244322999))
        make_face()
        with Locations((15, -15)):
            Circle(F0_R_2, mode=Mode.SUBTRACT)
        with BuildLine():
            Line((15.4755677001, 18.3), (14.5244322999, 18.3))
            ThreePointArc((14.5244322999, 18.3), (12.6424414496, 12.6424414496), (18.3, 14.5244322999))
            Line((18.3, 14.5244322999), (18.3, 15.4755677001))
            ThreePointArc((18.3, 15.4755677001), (17.3575585504, 17.3575585504), (15.4755677001, 18.3))
        make_face()
        with Locations((15, 15)):
            Circle(F0_R_2, mode=Mode.SUBTRACT)
    extrude(amount=F2_DEPTH)


solid = f1.part
